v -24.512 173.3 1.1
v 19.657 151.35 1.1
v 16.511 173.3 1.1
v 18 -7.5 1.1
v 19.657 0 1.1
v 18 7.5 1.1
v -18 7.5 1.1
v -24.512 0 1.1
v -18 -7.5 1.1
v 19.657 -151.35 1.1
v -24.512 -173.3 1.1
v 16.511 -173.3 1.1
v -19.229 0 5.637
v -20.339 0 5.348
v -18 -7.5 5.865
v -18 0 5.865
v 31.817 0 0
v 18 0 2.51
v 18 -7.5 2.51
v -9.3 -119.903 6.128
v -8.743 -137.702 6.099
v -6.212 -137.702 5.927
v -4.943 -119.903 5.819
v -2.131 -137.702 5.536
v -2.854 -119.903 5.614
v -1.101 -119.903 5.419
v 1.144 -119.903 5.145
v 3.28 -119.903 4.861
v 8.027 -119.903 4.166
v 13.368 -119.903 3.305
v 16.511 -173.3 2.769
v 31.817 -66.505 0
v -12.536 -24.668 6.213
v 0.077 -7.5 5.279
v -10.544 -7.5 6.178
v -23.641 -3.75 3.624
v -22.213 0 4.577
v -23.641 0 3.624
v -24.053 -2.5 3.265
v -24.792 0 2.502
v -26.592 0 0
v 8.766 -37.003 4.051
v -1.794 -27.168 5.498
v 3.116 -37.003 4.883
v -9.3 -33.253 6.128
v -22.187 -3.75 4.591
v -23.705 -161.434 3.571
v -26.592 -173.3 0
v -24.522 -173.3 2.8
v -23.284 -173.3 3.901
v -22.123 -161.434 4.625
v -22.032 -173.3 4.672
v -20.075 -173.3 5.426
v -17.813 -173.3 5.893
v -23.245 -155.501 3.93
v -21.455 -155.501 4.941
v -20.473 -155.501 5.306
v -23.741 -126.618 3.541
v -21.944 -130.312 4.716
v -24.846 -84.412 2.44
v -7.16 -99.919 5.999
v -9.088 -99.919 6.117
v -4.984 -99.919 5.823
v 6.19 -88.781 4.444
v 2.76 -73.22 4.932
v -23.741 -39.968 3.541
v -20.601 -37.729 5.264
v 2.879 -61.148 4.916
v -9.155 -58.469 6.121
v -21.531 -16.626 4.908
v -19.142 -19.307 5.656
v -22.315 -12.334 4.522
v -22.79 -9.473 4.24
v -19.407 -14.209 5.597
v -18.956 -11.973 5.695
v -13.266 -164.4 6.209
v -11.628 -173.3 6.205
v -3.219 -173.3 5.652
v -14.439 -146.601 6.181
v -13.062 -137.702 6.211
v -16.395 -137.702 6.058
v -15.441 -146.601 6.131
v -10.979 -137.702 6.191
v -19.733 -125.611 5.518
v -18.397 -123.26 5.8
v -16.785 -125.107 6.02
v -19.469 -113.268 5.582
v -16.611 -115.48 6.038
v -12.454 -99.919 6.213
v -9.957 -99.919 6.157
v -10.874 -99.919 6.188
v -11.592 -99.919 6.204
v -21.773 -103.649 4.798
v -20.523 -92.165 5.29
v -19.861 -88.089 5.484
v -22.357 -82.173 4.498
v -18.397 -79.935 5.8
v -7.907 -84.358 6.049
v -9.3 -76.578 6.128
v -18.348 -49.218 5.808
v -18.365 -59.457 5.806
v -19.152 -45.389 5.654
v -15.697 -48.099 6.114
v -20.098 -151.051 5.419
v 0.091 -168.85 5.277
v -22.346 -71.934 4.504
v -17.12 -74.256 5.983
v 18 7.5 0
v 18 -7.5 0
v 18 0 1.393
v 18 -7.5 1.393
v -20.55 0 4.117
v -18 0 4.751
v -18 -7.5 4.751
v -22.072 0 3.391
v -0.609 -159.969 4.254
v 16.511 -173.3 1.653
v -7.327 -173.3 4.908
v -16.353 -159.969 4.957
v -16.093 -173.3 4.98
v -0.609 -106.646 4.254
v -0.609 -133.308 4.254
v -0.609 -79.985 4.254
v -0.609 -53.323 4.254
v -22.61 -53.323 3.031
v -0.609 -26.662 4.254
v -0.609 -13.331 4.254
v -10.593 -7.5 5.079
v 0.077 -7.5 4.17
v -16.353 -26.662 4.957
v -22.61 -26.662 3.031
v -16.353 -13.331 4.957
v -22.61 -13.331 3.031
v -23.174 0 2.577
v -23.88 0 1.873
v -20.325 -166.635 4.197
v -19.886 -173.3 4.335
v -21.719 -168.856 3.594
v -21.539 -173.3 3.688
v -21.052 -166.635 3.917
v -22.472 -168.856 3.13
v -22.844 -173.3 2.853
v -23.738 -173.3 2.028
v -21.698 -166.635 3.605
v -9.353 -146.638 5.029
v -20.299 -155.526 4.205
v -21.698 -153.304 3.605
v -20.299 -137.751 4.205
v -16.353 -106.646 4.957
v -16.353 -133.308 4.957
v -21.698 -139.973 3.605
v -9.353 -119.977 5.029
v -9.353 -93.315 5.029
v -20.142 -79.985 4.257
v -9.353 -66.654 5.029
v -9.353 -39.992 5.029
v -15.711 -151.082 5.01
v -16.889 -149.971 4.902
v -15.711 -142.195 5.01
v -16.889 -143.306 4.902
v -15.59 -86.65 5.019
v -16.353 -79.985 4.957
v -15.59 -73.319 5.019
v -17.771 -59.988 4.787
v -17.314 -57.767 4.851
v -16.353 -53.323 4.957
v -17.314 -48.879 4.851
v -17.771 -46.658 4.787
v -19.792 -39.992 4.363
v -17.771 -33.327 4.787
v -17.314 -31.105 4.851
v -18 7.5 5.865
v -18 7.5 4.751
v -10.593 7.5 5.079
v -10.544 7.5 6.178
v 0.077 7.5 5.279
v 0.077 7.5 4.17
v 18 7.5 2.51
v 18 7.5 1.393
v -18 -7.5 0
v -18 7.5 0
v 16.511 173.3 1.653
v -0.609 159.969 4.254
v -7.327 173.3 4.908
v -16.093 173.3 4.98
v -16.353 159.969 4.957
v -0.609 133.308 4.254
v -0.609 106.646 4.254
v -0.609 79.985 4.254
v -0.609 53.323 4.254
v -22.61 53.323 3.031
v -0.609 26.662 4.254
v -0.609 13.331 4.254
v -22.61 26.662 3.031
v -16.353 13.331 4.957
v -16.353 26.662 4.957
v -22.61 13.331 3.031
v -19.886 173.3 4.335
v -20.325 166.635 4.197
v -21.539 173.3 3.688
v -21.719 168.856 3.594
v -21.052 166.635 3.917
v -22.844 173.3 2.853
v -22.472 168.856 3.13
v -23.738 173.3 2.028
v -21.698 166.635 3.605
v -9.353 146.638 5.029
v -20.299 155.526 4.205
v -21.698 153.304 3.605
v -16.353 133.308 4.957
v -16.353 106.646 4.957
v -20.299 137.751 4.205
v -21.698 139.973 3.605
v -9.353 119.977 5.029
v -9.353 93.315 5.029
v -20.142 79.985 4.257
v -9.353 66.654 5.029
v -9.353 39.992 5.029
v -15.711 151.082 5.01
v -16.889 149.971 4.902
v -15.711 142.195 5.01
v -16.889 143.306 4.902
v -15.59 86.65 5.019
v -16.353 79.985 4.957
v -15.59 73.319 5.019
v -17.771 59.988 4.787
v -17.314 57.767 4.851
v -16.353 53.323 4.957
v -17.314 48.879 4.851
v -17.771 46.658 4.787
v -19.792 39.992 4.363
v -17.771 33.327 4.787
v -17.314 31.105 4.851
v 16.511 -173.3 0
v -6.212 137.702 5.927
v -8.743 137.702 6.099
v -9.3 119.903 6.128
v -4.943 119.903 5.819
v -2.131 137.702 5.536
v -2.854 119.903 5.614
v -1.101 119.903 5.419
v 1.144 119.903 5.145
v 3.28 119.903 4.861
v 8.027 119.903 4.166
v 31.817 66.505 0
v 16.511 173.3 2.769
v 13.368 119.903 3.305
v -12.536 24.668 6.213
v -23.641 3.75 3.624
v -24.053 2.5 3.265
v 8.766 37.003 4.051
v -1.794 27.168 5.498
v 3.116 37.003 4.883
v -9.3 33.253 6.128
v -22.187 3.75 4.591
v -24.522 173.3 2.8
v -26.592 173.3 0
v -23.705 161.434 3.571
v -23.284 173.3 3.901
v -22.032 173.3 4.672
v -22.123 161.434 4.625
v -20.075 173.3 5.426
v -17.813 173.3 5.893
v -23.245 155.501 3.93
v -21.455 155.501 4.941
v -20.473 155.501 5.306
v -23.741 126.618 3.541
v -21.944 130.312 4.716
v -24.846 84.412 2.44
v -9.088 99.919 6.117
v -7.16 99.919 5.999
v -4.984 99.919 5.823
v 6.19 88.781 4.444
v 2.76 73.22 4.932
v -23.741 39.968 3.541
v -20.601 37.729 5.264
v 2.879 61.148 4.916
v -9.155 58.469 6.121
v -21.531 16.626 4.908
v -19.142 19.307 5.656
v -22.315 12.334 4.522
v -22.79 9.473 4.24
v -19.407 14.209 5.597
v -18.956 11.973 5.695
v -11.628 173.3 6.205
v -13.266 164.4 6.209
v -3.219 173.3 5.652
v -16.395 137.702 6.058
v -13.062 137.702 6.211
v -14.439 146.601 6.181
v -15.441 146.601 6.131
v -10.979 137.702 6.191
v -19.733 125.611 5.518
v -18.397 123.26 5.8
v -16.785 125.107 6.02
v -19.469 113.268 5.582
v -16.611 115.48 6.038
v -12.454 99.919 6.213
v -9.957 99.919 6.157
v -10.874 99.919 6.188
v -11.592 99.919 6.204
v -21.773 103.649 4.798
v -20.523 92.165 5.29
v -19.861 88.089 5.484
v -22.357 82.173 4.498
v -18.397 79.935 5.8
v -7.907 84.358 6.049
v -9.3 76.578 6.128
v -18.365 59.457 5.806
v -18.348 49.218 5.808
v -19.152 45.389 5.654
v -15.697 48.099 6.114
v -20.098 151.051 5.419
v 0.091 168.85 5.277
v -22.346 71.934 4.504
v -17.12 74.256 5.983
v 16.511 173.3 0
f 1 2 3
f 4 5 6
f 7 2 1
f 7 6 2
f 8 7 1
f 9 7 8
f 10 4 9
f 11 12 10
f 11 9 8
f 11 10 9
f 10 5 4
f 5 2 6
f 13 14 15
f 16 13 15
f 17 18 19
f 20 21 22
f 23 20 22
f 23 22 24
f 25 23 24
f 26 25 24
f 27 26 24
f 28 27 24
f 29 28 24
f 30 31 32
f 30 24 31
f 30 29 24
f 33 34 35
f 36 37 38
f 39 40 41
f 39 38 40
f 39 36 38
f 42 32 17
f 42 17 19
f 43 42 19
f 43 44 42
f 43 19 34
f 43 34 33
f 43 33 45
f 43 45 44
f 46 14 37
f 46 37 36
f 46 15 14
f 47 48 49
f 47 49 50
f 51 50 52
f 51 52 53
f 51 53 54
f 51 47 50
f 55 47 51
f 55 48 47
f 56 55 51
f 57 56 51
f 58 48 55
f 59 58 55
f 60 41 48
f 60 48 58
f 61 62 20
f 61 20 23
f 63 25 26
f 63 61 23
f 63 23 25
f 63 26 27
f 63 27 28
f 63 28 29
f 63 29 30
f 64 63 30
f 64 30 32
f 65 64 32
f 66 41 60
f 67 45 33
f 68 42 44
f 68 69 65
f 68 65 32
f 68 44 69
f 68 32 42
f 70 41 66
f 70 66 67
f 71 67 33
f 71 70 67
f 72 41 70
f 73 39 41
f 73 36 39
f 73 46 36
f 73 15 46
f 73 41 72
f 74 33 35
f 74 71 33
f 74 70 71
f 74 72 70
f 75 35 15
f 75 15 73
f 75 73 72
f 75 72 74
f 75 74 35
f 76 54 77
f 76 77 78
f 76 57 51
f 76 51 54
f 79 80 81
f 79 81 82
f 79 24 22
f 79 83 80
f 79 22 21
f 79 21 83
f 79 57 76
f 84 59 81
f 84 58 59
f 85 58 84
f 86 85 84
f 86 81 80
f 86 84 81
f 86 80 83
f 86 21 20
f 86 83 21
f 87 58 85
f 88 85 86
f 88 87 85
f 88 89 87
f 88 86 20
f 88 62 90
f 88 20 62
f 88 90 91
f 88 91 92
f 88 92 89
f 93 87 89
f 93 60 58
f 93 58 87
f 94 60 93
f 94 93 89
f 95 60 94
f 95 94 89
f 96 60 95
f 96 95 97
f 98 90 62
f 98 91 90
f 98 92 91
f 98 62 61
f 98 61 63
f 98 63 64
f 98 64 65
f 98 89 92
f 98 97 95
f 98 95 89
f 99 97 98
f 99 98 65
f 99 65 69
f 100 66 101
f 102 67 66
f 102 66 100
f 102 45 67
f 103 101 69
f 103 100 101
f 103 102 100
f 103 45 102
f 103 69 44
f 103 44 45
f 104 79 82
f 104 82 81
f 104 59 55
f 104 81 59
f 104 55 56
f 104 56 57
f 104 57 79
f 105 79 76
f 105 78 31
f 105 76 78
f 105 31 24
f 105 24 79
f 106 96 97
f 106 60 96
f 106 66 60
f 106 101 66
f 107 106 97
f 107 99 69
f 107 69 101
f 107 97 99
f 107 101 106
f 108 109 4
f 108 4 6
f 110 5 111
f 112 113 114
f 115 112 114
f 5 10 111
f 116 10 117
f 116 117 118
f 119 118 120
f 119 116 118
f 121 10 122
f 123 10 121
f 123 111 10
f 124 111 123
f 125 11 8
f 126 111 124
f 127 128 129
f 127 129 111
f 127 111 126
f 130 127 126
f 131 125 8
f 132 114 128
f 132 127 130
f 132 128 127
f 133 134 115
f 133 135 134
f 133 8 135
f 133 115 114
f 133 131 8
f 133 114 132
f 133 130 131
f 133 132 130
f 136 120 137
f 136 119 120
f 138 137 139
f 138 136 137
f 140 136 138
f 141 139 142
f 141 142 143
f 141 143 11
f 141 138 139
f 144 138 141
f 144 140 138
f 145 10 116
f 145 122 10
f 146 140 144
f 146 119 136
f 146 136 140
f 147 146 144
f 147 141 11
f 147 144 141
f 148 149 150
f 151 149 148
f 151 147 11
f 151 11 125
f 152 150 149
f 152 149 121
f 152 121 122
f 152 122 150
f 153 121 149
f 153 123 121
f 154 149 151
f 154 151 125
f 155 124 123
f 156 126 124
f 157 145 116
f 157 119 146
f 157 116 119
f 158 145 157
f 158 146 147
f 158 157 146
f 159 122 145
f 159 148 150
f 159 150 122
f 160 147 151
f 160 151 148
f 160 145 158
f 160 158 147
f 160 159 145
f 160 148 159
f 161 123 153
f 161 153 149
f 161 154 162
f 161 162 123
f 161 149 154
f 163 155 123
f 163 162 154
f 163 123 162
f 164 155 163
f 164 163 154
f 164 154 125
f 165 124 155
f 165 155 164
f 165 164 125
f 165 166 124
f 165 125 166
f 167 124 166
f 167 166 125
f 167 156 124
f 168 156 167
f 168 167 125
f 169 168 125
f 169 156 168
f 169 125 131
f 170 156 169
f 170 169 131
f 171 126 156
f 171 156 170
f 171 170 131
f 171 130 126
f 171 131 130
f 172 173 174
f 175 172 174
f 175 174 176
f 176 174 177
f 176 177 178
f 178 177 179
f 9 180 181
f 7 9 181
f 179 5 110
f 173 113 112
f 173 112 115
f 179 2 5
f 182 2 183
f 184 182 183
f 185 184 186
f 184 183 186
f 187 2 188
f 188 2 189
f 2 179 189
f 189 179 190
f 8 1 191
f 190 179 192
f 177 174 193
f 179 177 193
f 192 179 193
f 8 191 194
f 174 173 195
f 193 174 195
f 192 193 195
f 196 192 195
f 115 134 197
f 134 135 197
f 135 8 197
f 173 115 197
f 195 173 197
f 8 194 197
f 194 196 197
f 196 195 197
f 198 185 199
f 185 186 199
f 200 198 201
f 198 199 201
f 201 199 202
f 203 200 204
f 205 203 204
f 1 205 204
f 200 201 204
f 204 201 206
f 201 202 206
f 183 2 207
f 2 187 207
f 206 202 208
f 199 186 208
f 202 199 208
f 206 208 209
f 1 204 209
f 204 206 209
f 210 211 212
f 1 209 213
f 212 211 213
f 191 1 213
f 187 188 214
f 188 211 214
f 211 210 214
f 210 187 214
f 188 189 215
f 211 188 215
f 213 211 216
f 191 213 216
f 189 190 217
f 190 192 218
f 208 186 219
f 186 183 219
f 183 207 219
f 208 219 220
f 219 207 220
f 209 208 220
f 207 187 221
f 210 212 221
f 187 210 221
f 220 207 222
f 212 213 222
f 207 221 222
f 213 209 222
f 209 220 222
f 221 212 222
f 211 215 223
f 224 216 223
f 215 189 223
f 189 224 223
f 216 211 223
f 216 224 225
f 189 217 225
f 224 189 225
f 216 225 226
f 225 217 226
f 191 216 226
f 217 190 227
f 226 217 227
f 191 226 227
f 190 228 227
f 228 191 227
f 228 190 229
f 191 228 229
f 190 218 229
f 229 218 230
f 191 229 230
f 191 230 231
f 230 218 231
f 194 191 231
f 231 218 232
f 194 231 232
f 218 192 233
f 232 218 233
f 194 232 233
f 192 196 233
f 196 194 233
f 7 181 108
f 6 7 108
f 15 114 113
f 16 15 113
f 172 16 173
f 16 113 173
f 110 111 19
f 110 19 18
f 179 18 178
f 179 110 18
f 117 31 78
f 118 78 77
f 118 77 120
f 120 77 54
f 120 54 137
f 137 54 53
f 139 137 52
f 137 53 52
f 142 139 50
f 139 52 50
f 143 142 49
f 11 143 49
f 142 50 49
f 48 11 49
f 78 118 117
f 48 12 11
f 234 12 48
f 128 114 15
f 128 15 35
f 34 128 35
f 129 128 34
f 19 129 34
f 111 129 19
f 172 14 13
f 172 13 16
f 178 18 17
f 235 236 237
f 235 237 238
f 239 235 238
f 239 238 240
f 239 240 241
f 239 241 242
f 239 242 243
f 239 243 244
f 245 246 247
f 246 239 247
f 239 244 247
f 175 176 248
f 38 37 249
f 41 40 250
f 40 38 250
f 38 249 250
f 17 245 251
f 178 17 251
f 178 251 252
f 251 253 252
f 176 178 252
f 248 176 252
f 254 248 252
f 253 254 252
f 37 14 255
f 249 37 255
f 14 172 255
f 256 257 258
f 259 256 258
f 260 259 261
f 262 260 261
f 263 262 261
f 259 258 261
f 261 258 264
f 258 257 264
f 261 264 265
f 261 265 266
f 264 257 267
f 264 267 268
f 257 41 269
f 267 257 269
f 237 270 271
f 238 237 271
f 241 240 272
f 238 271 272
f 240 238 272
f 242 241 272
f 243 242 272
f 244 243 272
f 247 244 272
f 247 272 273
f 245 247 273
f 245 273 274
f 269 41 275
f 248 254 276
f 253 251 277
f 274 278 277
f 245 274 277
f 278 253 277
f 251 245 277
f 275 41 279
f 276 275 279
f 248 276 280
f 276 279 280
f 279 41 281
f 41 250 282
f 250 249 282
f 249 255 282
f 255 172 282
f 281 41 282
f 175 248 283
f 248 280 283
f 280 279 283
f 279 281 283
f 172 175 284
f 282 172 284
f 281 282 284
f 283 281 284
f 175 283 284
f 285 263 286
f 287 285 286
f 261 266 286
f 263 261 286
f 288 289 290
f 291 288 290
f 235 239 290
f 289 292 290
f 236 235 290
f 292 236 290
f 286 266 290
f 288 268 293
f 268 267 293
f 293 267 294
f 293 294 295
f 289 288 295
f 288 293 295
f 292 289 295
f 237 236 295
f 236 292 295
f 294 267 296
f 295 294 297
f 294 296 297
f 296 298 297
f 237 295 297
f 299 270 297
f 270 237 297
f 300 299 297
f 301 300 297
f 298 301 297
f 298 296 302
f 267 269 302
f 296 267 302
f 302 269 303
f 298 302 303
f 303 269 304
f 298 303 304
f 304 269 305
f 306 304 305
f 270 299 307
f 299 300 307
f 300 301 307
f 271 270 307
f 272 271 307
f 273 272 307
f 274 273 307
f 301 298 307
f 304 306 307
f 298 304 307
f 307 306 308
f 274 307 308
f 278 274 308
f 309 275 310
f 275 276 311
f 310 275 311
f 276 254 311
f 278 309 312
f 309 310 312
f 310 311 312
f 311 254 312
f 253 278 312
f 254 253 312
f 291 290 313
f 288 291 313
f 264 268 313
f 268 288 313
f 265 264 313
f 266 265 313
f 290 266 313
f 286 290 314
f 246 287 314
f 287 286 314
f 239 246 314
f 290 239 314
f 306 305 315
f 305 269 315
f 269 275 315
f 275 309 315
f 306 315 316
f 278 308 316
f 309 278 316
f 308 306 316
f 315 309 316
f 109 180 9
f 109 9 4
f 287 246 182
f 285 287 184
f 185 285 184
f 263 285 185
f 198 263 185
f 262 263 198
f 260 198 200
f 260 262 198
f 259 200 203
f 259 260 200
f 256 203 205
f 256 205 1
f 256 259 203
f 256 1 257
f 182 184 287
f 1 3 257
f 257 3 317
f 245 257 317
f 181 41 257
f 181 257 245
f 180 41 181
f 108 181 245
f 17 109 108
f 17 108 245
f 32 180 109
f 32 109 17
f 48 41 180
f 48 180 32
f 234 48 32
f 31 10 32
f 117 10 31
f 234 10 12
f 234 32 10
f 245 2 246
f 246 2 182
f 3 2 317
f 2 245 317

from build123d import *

# Parameters (mm, degrees)
F2_DEPTH = 173.3
F4_DEPTH = 25
F6_W     = 36
F6_H     = 15
F7_DEPTH = 20


# Not quite as in the source:
# - ends of sketch curves that miss each other by under 0.0002 mm in the source are joined
# - the dataset's text gives a spline's control points without its knots; the knots are read off the source's solid


with BuildPart() as f2:
    # F1 (on face) → F2 (new body)
    with BuildSketch(Plane.XZ):
        with BuildLine():
            add(Edge.make_bspline(
                [(-26.5921223909, 0), (-25.2176326426, 2.1217019965), (-20.3510980326, 9.6338251033), (10.0223686099, 4.0248166048), (31.8172425032, 0)],
                knots=[0, 0, 0, 0, 0.2824370642, 1, 1, 1, 1], degree=3))
            Line((-26.5921223909, 0), (31.8172425032, 0))
        make_face()
        with BuildLine():
            add(Edge.make_bspline(
                [(19.6565909304, 1.0999999067), (16.1575857425, 1.7220457641), (9.0829705679, 2.9345711326), (0.8605637985, 4.1185996724), (-5.2320226887, 4.7661728451), (-9.4250497651, 5.0645366103), (-13.1839026492, 5.150174403), (-15.9032026434, 5.0246144265), (-17.7956903302, 4.7976821367), (-19.064531223, 4.5634552716), (-20.1691059627, 4.2672043663), (-21.4253720439, 3.7905449175), (-22.667375377, 3.0608525064), (-23.7126545919, 2.1017508626), (-24.2810764737, 1.407206711), (-24.5122916533, 1.0999768794)],
                knots=[0.1322462263, 0.1322462263, 0.1322462263, 0.1322462263, 0.25, 0.375, 0.4375, 0.5, 0.5625, 0.625, 0.65625, 0.6875, 0.71875, 0.75, 0.8125, 0.875, 0.9208192438, 0.9208192438, 0.9208192438, 0.9208192438], degree=3))
            Line((19.6565909304, 1.0999999067), (-24.5122916533, 1.0999768794))
        make_face(mode=Mode.SUBTRACT)
    extrude(amount=F2_DEPTH)

    # F3 (on Top) → F4 (cut)
    with BuildSketch(Plane.XY):
        Polygon((65.3333365917, -177.500128746), (42.7832975984, 10.0049925968), (15.9085858613, -177.500128746), align=None)
    extrude(amount=F4_DEPTH, mode=Mode.SUBTRACT)

    # F5: F2 across plane


with BuildPart() as f2_1:
    add(f2.part)
    add(f2.part.mirror(Plane.XZ))

    # F6 (on Top) → F7 (cut)
    with BuildSketch(Plane.XY):
        Rectangle(F6_W, F6_H)
    extrude(amount=F7_DEPTH, mode=Mode.SUBTRACT)


solid = f2_1.part
